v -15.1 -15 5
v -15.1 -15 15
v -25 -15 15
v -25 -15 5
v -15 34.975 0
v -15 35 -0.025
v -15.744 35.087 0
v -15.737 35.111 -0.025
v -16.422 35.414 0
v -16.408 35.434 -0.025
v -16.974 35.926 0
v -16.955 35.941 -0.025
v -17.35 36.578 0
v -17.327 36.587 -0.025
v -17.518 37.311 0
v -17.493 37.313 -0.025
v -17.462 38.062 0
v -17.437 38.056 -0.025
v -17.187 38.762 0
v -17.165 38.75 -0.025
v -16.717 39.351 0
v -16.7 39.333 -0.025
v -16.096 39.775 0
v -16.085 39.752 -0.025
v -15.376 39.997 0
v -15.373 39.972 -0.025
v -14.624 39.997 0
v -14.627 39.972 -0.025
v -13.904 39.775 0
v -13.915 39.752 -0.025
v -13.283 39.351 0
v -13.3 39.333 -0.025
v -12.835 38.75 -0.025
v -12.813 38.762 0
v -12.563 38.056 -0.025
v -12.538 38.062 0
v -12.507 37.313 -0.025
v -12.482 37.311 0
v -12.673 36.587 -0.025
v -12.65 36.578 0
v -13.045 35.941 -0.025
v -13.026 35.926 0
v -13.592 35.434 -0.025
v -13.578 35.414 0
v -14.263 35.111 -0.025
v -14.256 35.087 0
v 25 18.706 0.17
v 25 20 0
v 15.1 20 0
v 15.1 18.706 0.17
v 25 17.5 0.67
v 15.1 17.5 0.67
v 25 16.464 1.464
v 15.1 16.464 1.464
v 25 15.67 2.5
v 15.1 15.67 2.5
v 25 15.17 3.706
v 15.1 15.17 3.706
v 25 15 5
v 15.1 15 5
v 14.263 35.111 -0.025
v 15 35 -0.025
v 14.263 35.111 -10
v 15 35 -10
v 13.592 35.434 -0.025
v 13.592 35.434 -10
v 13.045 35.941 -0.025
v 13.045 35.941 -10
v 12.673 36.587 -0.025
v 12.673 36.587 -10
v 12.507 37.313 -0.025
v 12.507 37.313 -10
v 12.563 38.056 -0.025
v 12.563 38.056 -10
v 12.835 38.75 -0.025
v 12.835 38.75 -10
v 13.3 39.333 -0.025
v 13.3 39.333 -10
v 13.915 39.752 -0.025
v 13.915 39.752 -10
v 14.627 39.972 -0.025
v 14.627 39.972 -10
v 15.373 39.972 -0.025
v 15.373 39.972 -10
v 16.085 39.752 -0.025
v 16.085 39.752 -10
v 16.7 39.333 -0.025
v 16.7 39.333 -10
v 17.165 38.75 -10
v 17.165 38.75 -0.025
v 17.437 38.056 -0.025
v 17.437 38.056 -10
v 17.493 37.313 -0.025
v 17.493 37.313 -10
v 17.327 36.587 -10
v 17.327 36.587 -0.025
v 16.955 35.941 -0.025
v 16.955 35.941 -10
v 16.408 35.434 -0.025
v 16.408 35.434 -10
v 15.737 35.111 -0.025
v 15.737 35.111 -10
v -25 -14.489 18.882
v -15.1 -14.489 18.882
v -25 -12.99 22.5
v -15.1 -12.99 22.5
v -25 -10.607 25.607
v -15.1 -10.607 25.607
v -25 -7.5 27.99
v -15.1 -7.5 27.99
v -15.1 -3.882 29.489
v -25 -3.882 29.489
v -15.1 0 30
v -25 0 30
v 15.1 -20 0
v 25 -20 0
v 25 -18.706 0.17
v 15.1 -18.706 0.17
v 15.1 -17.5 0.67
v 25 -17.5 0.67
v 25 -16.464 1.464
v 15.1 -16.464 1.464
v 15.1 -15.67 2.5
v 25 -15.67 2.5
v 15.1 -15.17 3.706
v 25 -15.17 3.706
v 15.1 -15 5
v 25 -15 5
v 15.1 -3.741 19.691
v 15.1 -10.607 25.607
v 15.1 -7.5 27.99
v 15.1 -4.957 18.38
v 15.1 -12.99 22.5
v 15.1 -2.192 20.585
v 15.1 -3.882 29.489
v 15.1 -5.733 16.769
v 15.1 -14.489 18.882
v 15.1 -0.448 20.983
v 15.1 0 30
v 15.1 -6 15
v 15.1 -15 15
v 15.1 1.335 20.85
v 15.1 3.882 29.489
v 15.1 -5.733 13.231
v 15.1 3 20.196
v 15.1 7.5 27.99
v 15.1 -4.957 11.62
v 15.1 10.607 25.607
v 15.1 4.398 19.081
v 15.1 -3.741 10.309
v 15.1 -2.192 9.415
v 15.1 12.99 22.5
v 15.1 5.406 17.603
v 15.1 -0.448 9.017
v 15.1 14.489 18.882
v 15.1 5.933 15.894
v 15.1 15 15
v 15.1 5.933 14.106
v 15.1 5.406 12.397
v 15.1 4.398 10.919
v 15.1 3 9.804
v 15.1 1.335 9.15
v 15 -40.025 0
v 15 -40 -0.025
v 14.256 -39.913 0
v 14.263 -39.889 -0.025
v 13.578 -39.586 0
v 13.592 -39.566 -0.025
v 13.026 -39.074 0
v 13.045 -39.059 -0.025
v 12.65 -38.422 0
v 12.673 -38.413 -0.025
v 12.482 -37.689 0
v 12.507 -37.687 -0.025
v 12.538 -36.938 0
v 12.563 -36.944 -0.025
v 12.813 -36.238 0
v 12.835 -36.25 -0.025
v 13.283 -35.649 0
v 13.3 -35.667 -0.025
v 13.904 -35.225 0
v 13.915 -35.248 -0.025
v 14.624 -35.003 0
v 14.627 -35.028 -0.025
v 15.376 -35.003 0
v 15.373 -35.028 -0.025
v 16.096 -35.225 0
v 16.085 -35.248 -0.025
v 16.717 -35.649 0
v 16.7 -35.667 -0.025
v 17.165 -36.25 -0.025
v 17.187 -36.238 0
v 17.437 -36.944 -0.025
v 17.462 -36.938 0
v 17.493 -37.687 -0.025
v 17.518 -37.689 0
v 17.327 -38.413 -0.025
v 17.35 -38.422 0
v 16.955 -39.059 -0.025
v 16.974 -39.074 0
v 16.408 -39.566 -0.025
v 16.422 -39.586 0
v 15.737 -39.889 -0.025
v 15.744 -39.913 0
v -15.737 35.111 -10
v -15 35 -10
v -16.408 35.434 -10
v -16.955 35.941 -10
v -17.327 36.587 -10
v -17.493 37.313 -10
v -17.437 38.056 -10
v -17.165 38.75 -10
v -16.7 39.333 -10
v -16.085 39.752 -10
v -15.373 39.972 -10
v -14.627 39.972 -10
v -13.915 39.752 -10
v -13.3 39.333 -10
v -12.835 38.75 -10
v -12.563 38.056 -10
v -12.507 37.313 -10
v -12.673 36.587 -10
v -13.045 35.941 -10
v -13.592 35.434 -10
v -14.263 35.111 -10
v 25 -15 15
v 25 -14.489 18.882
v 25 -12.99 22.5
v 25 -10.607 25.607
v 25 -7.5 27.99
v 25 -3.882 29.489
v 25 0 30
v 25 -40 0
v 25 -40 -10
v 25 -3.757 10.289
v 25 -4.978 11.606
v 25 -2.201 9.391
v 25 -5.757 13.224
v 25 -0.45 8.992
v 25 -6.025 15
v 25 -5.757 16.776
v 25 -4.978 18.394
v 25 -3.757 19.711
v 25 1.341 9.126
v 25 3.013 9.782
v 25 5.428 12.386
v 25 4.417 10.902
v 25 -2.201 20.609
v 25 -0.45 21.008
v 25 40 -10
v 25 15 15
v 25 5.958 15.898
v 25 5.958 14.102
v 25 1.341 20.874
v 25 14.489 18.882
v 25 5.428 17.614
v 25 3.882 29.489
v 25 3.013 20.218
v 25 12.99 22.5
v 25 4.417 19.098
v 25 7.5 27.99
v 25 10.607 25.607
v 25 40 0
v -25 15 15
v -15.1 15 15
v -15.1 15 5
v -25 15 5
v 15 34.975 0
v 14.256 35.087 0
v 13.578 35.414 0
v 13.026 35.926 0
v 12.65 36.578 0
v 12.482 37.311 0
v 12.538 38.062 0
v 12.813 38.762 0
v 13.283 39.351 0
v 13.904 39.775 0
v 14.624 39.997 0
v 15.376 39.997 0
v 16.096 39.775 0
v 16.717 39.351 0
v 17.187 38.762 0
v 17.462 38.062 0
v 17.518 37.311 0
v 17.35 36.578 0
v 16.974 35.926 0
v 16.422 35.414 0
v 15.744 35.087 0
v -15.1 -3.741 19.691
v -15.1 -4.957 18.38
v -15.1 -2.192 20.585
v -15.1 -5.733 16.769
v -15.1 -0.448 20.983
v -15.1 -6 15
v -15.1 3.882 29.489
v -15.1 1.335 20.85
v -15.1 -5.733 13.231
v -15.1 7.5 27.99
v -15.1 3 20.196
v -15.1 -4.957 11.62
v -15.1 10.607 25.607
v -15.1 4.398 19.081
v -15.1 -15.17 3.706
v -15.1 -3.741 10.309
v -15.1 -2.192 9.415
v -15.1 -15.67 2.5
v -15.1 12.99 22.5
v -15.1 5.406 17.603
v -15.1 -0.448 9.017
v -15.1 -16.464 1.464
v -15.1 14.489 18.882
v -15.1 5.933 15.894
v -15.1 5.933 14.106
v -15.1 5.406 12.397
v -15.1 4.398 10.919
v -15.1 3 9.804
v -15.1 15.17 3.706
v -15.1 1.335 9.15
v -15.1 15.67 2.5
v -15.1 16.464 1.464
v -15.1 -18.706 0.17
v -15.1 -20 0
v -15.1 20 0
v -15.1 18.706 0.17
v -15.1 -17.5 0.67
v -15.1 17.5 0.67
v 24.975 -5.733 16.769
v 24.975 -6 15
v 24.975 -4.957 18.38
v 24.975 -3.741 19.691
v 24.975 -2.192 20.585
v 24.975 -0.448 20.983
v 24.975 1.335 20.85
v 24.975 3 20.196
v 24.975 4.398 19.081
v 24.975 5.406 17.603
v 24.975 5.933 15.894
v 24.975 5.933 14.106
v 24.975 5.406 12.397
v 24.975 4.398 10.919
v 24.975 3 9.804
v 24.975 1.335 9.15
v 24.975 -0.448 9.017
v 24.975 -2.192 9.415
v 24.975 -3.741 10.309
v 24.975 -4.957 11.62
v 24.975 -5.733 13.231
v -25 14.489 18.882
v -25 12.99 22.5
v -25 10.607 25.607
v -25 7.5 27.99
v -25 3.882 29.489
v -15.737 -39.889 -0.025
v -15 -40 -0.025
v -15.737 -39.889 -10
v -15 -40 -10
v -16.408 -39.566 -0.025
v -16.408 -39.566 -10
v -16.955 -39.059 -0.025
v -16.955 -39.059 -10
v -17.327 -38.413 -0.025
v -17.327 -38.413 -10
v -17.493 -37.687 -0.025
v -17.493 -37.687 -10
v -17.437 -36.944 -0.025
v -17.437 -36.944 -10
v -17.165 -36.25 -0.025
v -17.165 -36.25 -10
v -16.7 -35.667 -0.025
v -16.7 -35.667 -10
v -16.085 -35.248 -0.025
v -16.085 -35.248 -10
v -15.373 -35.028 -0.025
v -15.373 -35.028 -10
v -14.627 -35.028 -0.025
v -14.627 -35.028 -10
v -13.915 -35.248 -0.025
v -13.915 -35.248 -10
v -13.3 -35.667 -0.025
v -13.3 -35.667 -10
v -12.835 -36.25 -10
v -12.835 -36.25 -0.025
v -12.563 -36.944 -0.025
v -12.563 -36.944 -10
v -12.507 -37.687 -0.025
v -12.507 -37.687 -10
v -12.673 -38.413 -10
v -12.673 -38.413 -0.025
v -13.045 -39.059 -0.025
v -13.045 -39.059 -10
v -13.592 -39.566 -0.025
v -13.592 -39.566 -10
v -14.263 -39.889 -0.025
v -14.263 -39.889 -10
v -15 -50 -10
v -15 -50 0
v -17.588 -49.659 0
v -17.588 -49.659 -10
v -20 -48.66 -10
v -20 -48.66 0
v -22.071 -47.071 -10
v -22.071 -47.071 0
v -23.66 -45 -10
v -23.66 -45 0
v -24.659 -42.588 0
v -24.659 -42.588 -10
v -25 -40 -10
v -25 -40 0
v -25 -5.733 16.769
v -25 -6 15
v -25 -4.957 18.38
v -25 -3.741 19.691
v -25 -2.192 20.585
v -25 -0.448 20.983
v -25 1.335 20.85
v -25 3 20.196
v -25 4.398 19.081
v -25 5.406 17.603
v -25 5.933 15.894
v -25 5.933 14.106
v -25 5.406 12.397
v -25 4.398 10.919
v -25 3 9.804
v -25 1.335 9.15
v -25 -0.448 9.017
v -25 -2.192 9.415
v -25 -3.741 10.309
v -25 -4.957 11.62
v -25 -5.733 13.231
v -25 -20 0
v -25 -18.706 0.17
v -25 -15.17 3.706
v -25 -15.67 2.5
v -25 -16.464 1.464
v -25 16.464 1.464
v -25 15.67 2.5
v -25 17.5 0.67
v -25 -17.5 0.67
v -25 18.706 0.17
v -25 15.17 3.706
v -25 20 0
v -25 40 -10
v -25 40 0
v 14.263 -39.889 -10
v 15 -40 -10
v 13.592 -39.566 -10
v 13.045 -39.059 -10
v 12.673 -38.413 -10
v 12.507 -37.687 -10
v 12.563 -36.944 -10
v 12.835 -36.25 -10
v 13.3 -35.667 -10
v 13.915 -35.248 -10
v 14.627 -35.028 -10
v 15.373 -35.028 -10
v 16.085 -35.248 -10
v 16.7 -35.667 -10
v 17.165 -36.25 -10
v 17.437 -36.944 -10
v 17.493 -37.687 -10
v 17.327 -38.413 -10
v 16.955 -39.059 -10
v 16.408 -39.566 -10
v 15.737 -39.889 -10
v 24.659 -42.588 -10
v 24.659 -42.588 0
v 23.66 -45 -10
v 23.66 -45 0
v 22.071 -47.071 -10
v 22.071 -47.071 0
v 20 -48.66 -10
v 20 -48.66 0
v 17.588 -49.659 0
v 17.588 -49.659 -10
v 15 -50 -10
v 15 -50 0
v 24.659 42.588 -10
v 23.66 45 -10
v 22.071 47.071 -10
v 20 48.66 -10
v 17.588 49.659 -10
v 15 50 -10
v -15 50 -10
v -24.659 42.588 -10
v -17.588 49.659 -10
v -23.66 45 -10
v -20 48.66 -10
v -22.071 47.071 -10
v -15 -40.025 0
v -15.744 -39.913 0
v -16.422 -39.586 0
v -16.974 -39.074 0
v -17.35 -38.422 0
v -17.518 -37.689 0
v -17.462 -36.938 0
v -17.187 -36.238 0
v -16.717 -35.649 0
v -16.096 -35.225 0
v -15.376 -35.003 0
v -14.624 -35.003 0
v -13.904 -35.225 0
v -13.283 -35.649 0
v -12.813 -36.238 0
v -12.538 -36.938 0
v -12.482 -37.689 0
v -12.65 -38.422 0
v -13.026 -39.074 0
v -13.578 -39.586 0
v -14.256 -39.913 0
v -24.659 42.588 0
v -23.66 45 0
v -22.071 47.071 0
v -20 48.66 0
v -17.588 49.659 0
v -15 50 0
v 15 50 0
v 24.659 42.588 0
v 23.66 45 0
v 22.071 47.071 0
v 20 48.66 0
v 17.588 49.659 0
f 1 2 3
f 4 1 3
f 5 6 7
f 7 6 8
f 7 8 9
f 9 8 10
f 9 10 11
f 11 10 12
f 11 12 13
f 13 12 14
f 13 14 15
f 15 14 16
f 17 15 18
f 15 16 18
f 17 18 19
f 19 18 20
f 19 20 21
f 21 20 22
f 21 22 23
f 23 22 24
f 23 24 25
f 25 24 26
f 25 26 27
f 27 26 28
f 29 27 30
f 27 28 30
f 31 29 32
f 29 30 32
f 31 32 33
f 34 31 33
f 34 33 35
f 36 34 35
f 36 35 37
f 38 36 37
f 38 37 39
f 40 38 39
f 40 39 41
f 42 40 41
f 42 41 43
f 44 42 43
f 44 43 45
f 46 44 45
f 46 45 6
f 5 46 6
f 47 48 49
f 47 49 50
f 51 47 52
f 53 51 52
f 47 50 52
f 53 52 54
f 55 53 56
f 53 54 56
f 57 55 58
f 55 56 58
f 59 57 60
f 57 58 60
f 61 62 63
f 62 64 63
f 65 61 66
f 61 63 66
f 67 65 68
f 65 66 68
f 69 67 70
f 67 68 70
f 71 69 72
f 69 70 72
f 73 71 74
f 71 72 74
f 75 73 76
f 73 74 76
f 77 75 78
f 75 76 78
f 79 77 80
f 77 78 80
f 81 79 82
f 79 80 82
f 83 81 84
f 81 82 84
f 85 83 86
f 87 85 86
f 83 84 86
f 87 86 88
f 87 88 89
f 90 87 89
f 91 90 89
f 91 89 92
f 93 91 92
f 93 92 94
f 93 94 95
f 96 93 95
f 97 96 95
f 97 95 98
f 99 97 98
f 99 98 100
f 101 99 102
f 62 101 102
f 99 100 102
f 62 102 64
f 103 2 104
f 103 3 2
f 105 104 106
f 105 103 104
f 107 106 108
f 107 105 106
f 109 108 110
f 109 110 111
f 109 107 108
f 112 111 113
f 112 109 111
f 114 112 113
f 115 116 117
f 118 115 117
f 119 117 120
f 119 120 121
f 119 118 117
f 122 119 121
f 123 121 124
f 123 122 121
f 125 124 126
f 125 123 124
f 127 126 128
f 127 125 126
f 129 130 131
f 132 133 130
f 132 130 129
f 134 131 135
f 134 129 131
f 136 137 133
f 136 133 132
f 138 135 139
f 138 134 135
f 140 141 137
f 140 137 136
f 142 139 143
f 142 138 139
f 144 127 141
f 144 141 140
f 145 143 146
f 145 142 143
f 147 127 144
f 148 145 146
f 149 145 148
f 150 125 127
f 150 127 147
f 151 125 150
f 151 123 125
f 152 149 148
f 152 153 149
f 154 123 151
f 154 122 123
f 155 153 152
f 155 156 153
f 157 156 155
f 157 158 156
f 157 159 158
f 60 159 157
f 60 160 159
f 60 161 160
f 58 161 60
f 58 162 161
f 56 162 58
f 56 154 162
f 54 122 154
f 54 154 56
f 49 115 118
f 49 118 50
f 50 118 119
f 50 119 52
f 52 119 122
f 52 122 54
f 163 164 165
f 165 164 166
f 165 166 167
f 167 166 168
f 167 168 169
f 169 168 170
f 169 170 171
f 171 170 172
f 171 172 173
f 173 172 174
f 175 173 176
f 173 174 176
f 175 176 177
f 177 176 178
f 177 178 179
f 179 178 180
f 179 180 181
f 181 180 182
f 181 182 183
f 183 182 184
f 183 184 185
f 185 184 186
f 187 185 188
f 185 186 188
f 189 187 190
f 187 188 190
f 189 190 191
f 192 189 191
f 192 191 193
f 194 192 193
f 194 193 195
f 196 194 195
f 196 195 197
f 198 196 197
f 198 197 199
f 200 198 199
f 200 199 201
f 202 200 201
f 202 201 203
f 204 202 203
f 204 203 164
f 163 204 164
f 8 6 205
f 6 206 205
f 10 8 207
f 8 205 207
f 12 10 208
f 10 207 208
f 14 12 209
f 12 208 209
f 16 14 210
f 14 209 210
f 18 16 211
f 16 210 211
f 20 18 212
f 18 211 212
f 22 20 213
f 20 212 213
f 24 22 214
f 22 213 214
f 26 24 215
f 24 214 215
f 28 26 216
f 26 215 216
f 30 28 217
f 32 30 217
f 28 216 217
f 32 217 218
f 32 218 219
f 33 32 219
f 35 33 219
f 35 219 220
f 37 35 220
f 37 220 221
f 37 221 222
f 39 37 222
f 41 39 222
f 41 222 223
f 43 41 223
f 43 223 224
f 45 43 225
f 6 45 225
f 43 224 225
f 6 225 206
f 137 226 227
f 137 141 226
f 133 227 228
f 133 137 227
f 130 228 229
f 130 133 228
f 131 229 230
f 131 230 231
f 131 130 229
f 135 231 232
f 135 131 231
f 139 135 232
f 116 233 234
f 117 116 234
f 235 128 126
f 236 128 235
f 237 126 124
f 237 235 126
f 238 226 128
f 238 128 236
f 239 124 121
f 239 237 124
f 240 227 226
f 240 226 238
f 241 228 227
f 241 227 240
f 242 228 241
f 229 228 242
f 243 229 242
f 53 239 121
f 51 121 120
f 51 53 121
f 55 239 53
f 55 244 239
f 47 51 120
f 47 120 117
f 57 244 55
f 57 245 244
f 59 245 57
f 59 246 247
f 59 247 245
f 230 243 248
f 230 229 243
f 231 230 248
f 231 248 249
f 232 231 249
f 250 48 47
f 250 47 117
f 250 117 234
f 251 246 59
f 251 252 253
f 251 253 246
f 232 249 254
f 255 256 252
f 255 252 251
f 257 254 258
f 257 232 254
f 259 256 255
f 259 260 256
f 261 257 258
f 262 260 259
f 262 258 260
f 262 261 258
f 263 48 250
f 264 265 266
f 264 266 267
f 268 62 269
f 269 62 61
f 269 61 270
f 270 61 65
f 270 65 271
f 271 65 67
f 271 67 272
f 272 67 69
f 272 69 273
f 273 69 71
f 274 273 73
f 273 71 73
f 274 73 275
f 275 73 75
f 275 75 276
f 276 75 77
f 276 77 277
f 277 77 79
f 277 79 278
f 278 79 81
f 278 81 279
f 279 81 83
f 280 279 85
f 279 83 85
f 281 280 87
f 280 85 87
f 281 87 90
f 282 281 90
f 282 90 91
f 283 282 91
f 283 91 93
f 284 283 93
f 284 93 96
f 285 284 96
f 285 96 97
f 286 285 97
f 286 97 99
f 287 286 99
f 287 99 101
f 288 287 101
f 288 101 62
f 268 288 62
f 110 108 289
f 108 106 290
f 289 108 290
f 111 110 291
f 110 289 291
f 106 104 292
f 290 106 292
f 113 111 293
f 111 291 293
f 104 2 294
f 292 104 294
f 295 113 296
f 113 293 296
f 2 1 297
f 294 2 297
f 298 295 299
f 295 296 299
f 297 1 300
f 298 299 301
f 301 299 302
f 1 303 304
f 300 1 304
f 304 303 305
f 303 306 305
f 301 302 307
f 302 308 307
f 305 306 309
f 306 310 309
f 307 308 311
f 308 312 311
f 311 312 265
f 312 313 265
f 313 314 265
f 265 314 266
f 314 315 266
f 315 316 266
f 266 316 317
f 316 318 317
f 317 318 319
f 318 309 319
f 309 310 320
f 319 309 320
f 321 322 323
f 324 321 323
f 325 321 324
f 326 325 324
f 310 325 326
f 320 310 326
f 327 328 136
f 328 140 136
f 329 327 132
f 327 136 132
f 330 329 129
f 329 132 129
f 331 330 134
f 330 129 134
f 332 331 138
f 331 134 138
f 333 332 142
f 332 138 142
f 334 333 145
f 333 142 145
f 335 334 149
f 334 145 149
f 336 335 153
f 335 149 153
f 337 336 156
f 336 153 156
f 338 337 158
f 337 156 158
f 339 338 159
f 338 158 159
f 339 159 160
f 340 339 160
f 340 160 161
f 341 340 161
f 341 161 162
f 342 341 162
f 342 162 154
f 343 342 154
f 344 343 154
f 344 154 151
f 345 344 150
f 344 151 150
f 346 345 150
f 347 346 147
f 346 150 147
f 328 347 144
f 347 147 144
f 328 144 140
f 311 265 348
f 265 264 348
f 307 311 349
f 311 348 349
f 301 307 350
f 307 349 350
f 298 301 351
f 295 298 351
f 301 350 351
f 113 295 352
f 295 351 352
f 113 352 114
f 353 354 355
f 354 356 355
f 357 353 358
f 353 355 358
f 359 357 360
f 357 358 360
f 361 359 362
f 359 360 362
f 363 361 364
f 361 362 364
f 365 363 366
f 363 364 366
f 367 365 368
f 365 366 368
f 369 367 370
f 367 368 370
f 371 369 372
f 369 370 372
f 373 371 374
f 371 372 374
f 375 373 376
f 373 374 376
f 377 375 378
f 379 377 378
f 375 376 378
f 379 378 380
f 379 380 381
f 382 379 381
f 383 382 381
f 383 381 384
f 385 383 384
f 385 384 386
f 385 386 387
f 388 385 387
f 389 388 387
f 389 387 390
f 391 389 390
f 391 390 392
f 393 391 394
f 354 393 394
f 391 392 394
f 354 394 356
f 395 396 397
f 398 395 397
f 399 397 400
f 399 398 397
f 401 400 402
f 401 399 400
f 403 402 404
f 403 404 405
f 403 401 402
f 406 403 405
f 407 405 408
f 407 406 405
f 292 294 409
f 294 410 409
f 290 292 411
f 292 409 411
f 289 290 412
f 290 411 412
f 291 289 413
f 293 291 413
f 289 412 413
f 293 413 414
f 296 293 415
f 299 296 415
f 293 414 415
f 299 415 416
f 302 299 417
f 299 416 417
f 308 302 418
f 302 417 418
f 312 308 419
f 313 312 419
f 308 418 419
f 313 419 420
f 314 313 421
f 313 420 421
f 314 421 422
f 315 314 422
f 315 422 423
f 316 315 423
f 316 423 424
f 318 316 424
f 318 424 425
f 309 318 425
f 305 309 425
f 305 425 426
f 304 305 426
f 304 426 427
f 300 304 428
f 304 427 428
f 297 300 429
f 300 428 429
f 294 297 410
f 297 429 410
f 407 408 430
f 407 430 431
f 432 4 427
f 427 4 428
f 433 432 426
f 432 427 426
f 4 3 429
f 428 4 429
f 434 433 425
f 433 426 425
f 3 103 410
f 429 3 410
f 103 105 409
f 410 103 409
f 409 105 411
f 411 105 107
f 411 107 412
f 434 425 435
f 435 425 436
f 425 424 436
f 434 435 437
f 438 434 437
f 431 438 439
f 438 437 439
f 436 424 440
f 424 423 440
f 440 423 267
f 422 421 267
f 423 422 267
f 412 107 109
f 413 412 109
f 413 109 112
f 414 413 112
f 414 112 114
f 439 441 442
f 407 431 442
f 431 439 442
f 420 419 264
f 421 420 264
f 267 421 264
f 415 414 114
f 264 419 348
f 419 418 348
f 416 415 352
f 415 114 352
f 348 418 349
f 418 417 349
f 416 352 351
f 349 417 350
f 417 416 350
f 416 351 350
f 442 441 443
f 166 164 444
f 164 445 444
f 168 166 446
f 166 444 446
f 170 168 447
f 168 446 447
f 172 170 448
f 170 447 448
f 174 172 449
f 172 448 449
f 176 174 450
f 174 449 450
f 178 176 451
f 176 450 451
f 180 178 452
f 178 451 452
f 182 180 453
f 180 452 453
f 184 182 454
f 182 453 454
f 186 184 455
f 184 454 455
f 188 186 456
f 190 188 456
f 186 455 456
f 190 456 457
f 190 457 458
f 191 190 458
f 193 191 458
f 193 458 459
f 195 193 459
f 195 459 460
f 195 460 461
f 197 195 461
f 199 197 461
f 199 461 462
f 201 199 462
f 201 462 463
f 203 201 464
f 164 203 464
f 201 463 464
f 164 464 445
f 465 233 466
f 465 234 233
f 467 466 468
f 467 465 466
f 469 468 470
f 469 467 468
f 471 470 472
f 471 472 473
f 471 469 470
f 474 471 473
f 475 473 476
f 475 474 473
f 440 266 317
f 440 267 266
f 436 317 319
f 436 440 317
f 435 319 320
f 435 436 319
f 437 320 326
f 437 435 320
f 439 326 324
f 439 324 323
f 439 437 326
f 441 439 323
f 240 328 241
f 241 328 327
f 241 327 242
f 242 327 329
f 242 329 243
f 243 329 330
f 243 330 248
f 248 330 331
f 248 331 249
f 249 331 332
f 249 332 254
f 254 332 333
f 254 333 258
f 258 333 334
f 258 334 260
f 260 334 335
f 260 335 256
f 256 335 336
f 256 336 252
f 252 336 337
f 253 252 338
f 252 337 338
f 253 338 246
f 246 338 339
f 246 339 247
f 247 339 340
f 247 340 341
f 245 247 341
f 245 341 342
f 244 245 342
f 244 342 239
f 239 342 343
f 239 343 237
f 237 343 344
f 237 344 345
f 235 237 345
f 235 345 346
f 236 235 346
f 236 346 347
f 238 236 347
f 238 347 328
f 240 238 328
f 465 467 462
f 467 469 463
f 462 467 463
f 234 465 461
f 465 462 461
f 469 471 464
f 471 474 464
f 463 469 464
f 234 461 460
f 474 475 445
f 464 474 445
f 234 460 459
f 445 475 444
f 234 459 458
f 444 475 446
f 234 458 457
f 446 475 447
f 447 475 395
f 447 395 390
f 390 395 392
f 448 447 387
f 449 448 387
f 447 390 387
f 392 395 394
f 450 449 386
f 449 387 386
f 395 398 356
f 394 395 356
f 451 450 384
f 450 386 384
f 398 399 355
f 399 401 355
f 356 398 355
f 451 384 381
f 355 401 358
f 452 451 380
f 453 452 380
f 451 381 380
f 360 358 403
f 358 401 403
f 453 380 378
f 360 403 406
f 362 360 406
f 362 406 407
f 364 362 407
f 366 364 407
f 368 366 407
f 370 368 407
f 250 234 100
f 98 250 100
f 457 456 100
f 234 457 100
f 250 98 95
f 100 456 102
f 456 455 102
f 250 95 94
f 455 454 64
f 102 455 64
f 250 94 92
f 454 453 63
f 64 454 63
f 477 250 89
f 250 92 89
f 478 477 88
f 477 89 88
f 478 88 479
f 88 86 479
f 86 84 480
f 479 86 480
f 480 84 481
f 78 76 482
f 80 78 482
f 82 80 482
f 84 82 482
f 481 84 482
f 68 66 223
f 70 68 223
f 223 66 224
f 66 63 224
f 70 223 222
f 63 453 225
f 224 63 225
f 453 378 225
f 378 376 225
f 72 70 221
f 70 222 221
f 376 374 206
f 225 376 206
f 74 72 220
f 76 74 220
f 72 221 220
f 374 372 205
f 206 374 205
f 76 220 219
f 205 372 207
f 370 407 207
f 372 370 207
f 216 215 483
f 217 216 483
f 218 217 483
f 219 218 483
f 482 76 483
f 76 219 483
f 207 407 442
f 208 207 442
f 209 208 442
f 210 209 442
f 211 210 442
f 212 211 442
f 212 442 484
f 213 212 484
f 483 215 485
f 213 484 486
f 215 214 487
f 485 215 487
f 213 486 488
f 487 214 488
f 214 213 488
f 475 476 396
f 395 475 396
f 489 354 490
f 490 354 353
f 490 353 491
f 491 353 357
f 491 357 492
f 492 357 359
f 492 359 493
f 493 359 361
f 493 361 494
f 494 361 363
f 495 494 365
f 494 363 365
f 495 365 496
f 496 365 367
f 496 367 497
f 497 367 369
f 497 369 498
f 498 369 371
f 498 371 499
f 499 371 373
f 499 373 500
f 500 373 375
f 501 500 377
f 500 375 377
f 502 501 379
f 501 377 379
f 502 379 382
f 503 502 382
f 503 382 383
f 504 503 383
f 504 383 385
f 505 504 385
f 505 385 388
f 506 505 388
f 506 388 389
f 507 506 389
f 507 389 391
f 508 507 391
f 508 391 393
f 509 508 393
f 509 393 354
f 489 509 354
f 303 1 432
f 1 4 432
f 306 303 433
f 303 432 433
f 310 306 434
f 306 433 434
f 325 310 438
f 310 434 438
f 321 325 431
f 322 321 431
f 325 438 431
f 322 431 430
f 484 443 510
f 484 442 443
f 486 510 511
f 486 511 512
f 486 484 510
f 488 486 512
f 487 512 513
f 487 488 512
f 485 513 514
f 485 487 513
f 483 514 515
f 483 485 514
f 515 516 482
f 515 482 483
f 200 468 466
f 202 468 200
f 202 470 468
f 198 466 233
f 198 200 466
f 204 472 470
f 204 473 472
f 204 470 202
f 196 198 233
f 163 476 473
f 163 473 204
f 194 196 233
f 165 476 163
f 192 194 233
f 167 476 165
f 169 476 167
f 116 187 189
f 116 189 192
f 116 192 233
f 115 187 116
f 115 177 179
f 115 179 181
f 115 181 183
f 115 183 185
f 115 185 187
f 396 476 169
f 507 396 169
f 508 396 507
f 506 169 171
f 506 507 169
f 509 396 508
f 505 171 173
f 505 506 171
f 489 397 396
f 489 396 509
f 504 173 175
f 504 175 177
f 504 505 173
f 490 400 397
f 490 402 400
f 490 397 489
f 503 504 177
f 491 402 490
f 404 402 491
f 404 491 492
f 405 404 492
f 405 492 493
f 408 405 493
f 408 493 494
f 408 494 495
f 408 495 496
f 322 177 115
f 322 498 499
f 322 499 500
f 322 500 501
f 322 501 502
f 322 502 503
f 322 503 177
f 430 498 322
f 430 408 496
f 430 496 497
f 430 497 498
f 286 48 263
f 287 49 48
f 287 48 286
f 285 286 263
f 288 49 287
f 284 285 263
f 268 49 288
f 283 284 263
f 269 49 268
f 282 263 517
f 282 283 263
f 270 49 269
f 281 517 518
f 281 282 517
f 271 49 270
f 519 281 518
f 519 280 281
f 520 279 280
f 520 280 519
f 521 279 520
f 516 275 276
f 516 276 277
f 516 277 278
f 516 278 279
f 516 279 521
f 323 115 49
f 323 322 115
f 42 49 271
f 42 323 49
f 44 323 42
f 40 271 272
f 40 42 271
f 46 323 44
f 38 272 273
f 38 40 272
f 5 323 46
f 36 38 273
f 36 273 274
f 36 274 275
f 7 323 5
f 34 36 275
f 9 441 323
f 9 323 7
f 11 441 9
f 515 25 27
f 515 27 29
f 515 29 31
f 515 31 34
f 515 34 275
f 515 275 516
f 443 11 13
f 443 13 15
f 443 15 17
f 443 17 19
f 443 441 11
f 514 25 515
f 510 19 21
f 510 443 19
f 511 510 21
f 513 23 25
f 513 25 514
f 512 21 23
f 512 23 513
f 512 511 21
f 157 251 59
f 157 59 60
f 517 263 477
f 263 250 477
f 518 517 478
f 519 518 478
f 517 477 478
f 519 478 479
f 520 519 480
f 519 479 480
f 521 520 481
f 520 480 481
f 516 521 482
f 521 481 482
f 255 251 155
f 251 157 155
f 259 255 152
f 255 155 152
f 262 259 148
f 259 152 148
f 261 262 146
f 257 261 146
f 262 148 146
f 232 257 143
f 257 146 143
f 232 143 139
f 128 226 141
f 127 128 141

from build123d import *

# Parameters (mm, degrees)
SKETCH1_W                        = 100
SKETCH1_H                        = 50
BOSS_EXTRUDE1_DEPTH              = 10
SKETCH2_W                        = 30
SKETCH2_H                        = 9.9
BOSS_EXTRUDE2_DEPTH              = 30
FILLET1_R                        = 15
F_12_0MM_DOWEL_HOLE1_D           = 12
F_12_0MM_DOWEL_HOLE1_CSINK_D     = 12.05
F_12_0MM_DOWEL_HOLE1_CSINK_ANGLE = 90
F_5_0MM_DOWEL_HOLE1_D            = 5
F_5_0MM_DOWEL_HOLE1_CSINK_D      = 5.05
F_5_0MM_DOWEL_HOLE1_CSINK_ANGLE  = 90
FILLET2_R                        = 5
FILLET3_R                        = 10


with BuildPart() as part:
    # Sketch1 → Boss-Extrude1 (new body)
    with BuildSketch(Plane(origin=(0, 0, 0), x_dir=(0, 1, 0), z_dir=(0, 0, 1))):
        Rectangle(SKETCH1_W, SKETCH1_H)
    extrude(amount=-BOSS_EXTRUDE1_DEPTH)

    # Sketch2 → Boss-Extrude2 (add)
    with BuildSketch(Plane(origin=(0, 0, 0), x_dir=(0, 1, 0), z_dir=(0, 0, 1))):
        with Locations((0, 20.05)):
            Rectangle(SKETCH2_W, SKETCH2_H)
        with Locations((0, -20.05)):
            Rectangle(SKETCH2_W, SKETCH2_H)
    extrude(amount=BOSS_EXTRUDE2_DEPTH)

    # Fillet1
    fillet1_edges = [part.edges().sort_by_distance(p)[0] for p in [
        (20.05, 15, 30),
        (20.05, -15, 30),
        (-20.05, 15, 30),
        (-20.05, -15, 30),
    ]]
    fillet(fillet1_edges, radius=FILLET1_R - 0.0001)  # a hair under: the kernel refuses the full size

    # Ø12.0mm Dowel Hole1 (through all)
    with Locations(Plane.YZ.offset(25)):
        with Locations((0, 15)):
            CounterSinkHole(F_12_0MM_DOWEL_HOLE1_D / 2, F_12_0MM_DOWEL_HOLE1_CSINK_D / 2, counter_sink_angle=F_12_0MM_DOWEL_HOLE1_CSINK_ANGLE)

    # Ø5.0mm Dowel Hole1 (through all)
    with Locations(Plane(origin=(0, 0, 0), x_dir=(0, 1, 0), z_dir=(0, 0, 1))):
        with Locations((37.5, -15), (-37.5, 15), (-37.5, -15), (37.5, 15)):
            CounterSinkHole(F_5_0MM_DOWEL_HOLE1_D / 2, F_5_0MM_DOWEL_HOLE1_CSINK_D / 2, counter_sink_angle=F_5_0MM_DOWEL_HOLE1_CSINK_ANGLE)

    # Fillet2
    fillet2_edges = [part.edges().sort_by_distance(p)[0] for p in [
        (-20.05, -15, 0),
        (-20.05, 15, 0),
        (20.05, -15, 0),
        (20.05, 15, 0),
    ]]
    fillet(fillet2_edges, radius=FILLET2_R)

    # Fillet3
    fillet3_edges = [part.edges().sort_by_distance(p)[0] for p in [
        (-25, -50, -5),
        (-25, 50, -5),
        (25, 50, -5),
        (25, -50, -5),
    ]]
    fillet(fillet3_edges, radius=FILLET3_R)


solid = part.part
